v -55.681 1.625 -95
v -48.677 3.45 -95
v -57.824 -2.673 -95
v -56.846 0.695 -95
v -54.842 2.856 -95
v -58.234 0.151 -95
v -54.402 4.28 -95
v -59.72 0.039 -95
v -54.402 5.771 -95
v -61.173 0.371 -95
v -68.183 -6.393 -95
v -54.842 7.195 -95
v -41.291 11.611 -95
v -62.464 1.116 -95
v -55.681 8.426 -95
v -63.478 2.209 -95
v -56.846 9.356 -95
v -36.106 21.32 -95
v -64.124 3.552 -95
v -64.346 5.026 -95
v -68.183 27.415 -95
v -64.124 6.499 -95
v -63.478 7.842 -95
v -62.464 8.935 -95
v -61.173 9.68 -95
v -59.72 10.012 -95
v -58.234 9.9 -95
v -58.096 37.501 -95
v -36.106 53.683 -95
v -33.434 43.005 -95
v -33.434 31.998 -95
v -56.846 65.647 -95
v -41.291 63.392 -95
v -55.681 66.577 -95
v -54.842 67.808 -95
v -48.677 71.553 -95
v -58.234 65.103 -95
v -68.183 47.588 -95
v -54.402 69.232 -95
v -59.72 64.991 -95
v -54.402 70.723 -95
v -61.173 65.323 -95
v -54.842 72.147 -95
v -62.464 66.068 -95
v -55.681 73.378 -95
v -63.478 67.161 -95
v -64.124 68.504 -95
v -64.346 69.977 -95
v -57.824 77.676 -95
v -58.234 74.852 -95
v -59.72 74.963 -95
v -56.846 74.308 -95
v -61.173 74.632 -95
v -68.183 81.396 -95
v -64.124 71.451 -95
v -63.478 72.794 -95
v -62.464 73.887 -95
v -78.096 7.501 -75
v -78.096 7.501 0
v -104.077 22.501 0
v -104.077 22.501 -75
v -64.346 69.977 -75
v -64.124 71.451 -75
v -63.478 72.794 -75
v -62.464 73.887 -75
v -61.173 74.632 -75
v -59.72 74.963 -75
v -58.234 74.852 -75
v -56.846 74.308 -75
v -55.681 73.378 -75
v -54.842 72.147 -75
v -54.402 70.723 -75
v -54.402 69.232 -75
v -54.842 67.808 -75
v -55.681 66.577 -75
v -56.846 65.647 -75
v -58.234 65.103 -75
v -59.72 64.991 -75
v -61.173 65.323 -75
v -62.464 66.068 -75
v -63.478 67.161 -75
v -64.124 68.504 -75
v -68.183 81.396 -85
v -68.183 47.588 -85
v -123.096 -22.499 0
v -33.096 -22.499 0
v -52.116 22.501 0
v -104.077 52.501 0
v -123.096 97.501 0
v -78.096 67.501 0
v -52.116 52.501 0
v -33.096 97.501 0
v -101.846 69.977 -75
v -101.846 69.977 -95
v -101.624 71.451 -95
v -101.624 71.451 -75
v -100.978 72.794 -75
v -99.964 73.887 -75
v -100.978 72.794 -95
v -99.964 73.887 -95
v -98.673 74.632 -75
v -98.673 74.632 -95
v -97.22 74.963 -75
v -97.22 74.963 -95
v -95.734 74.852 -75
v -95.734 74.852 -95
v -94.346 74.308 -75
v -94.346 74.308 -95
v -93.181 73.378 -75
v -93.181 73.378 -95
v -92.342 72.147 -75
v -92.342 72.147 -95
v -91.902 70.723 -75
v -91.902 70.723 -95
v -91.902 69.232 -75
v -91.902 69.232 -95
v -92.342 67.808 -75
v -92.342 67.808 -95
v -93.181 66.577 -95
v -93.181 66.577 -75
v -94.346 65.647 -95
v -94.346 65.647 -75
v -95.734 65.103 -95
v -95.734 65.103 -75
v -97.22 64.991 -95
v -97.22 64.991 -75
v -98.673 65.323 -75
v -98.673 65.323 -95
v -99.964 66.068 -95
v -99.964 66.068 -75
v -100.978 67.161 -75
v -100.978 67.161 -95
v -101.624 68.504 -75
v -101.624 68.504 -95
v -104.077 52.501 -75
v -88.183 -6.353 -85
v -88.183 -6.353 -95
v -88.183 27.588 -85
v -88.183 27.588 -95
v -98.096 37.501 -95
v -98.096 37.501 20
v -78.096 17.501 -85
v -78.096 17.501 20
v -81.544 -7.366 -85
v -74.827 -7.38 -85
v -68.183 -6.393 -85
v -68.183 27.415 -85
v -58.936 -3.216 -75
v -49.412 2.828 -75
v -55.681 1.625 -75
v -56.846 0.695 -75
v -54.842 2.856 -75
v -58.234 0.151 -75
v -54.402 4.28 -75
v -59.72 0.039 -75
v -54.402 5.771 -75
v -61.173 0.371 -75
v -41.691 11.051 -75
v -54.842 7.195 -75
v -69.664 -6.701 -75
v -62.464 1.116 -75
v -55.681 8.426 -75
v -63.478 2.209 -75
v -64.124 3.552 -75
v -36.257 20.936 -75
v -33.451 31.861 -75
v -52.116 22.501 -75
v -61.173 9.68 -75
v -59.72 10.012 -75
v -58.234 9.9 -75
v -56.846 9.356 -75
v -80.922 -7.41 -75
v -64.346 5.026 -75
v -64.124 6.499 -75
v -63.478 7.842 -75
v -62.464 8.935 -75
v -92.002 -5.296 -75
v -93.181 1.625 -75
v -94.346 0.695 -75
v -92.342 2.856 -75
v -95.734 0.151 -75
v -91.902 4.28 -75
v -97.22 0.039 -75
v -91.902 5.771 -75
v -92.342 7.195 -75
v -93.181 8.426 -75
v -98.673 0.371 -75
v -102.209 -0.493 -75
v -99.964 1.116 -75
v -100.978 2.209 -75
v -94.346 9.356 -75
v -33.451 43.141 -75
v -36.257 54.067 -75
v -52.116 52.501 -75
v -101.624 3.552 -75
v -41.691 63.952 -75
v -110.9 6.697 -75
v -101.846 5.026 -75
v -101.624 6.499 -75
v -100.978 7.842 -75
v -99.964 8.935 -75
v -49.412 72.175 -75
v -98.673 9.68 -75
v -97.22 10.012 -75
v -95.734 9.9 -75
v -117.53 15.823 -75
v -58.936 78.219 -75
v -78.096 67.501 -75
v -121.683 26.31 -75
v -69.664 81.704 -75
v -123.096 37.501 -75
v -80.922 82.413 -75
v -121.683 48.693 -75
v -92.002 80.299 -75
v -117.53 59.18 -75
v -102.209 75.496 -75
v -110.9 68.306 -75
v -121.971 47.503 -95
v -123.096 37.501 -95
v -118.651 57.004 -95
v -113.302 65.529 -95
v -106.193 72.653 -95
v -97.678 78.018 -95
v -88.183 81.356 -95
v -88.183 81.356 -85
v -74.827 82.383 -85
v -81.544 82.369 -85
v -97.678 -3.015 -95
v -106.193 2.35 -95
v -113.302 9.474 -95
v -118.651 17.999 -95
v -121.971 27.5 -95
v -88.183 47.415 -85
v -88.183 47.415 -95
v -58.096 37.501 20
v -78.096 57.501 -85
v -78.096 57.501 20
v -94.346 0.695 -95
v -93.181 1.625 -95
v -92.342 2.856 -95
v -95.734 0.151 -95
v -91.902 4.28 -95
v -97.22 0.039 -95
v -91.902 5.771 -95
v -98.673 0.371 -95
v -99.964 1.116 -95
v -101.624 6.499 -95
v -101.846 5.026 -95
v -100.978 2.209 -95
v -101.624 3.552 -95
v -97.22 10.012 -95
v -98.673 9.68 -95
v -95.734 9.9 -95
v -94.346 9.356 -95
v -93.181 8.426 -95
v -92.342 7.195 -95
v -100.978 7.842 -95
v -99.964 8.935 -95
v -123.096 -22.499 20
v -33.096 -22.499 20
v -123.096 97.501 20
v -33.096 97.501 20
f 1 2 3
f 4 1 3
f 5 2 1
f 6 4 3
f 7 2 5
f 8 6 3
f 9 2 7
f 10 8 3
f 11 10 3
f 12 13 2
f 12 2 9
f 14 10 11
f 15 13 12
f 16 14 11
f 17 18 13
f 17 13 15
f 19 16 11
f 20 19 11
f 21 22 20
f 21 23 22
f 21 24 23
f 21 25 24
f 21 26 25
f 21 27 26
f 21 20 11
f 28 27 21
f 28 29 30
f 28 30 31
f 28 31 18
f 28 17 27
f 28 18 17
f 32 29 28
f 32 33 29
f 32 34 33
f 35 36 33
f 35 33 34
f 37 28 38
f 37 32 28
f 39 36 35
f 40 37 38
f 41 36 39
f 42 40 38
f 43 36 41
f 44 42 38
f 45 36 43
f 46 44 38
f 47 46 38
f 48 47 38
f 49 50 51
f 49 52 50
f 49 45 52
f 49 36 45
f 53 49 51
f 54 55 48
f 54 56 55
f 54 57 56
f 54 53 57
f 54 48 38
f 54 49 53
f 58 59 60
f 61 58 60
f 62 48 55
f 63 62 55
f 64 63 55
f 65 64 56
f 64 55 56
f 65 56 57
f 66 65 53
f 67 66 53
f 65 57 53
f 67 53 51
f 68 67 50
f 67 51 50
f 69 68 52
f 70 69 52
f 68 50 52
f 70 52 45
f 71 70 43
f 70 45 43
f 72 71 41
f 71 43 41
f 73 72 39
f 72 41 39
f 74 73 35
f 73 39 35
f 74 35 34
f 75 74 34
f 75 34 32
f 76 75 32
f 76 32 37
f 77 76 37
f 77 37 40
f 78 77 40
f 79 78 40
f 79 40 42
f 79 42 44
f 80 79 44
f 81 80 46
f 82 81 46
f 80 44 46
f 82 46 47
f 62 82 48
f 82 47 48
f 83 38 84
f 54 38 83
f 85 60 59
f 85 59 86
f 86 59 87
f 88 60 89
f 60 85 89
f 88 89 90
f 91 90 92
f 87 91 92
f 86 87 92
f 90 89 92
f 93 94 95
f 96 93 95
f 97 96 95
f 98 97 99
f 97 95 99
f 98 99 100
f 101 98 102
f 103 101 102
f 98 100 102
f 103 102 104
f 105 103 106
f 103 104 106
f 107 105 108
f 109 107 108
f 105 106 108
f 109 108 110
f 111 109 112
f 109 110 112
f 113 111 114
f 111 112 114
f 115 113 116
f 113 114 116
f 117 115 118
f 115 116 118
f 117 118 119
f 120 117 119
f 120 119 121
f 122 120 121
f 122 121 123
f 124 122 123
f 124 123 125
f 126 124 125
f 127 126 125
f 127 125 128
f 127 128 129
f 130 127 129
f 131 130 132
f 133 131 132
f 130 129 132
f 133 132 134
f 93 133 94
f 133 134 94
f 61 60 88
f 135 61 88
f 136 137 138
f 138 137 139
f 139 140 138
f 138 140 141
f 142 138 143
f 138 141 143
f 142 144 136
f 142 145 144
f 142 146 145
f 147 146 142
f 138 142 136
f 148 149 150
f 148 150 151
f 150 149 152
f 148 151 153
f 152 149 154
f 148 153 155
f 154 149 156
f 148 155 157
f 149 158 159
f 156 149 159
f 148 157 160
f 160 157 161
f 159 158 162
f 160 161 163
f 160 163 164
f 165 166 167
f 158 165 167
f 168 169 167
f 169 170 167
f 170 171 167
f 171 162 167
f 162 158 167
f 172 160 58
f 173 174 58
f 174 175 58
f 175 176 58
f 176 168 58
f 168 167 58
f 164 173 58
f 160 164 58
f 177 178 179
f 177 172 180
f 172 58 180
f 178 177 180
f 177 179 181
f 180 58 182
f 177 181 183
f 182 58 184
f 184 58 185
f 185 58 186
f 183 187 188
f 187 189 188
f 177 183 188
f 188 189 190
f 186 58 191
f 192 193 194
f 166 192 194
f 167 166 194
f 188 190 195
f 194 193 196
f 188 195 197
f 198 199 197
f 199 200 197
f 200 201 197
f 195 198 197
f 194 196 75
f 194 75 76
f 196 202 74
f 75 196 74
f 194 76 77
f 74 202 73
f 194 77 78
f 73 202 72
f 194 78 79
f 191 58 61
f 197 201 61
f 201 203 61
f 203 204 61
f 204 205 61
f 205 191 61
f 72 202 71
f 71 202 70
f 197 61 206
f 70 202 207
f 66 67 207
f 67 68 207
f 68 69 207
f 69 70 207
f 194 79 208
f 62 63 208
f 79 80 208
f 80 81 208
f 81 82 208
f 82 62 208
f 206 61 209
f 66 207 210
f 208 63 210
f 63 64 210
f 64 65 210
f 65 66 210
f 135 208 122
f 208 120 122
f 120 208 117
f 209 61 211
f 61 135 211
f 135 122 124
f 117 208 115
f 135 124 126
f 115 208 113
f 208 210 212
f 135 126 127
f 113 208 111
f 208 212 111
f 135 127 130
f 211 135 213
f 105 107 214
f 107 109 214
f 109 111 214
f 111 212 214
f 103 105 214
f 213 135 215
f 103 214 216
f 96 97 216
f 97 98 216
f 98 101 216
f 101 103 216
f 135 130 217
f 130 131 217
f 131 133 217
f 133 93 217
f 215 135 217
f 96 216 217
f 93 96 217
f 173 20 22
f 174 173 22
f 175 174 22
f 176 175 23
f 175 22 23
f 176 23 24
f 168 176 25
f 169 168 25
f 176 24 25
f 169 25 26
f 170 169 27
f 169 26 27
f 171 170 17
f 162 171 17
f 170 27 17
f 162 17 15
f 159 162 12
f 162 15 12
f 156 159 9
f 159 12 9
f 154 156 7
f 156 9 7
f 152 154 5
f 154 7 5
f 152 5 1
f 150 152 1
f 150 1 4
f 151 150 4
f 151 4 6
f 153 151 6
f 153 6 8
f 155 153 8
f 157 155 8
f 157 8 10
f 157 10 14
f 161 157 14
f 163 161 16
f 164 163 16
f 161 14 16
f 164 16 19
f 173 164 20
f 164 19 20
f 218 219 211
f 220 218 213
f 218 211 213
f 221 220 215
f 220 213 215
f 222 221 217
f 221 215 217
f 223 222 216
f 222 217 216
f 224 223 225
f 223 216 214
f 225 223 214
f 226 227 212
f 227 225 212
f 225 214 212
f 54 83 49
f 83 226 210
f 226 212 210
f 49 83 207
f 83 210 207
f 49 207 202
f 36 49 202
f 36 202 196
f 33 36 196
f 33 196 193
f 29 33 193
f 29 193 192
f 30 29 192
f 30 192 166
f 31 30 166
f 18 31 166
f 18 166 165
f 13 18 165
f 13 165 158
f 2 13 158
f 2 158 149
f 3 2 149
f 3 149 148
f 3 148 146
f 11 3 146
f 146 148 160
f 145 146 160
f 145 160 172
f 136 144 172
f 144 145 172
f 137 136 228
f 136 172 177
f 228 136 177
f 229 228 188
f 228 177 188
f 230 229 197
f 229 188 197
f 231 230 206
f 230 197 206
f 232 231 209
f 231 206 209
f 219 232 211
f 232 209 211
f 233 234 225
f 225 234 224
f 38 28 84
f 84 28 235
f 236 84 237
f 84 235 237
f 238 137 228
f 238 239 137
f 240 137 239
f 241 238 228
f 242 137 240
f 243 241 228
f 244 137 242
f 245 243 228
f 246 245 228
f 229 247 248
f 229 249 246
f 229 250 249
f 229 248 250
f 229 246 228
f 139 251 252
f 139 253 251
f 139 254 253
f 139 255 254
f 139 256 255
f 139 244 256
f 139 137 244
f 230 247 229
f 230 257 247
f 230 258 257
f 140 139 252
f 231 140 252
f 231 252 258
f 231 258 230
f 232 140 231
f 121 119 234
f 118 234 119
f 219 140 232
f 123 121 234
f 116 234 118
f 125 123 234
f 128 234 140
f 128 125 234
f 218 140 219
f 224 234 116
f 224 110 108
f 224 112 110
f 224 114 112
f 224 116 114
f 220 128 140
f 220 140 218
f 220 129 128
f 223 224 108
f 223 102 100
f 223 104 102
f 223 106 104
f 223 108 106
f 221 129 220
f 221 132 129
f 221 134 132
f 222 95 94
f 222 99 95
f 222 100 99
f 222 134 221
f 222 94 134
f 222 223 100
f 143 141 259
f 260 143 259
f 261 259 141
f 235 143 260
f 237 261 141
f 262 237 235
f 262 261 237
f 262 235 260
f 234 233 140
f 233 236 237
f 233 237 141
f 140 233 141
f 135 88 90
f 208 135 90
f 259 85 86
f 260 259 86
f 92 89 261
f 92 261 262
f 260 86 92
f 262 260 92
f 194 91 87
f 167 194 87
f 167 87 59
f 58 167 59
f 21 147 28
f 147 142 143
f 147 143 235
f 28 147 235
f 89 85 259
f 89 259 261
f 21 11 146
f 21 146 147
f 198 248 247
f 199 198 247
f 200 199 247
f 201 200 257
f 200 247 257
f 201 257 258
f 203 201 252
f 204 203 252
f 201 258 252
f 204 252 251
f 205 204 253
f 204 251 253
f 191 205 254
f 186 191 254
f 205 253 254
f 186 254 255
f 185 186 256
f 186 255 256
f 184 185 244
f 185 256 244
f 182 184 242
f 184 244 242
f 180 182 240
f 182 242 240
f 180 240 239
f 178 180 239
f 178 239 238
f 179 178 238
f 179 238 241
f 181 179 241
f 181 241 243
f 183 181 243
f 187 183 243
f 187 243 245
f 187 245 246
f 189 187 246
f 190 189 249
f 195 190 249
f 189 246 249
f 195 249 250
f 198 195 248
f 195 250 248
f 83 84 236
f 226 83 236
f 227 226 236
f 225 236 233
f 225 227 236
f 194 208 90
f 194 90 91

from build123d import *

# Parameters (mm, degrees)
SKETCH2_W           = 90
SKETCH2_H           = 120
BOSS_EXTRUDE4_DEPTH = 20
BOSS_EXTRUDE5_DEPTH = 75
SKETCH20_R          = 45
BOSS_EXTRUDE6_DEPTH = 20
SKETCH21_W          = 20
SKETCH21_H          = 100
BOSS_EXTRUDE8_DEPTH = 10
SKETCH26_R          = 5
CUT_EXTRUDE2_DEPTH  = 20
CUT_EXTRUDE3_DEPTH  = 115


with BuildPart() as part:
    # Sketch2 → Boss-Extrude4 (new body)
    with BuildSketch(Plane.XY):
        with Locations((-78.096450442, 37.501466256)):
            Rectangle(SKETCH2_W, SKETCH2_H)
    extrude(amount=BOSS_EXTRUDE4_DEPTH)

    # Sketch19 → Boss-Extrude5 (add)
    with BuildSketch(Plane(origin=(0, 0, 0), x_dir=(-1, 0, 0), z_dir=(0, 0, -1))):
        Polygon((78.096450442, 67.501466256), (52.115688328, 52.501466256), (52.115688328, 22.501466256), (78.096450442, 7.501466256), (104.077212555, 22.501466256), (104.077212555, 52.501466256), align=None)
    extrude(amount=BOSS_EXTRUDE5_DEPTH)

    # Sketch20 → Boss-Extrude6 (add)
    with BuildSketch(Plane(origin=(0, 0, -75), x_dir=(-1, 0, 0), z_dir=(0, 0, -1))):
        with Locations((78.096450442, 37.501466256)):
            Circle(SKETCH20_R)
    extrude(amount=BOSS_EXTRUDE6_DEPTH)


with BuildPart() as body_2:
    # Sketch21 → Boss-Extrude8 (new body)
    with BuildSketch(Plane(origin=(0, 0, -95), x_dir=(-1, 0, 0), z_dir=(0, 0, -1))):
        with Locations((78.183292606, 37.571308656)):
            Rectangle(SKETCH21_W, SKETCH21_H)
    extrude(amount=-BOSS_EXTRUDE8_DEPTH)


with BuildPart() as part_1:
    add(part.part)

    # Combine1: cut body 2
    add(body_2.part, mode=Mode.SUBTRACT)

    # Sketch26 → Cut-Extrude2 (cut)
    with BuildSketch(Plane(origin=(0, 0, -95), x_dir=(-1, 0, 0), z_dir=(0, 0, -1))):
        with Locations((59.346450442, 69.977418898)):
            Circle(SKETCH26_R)
        with Locations((96.846450442, 69.977418898)):
            Circle(SKETCH26_R)
        with Locations((59.346450442, 5.025513614)):
            Circle(SKETCH26_R)
        with Locations((96.846450442, 5.025513614)):
            Circle(SKETCH26_R)
    extrude(amount=-CUT_EXTRUDE2_DEPTH, mode=Mode.SUBTRACT)

    # Sketch28 → Cut-Extrude3 (cut)
    with BuildSketch(Plane.XY.offset(20)):
        Polygon((-58.096450442, 37.501466256), (-78.096450442, 57.501466256), (-98.096450442, 37.501466256), (-78.096450442, 17.501466256), align=None)
    extrude(amount=-CUT_EXTRUDE3_DEPTH, mode=Mode.SUBTRACT)


solid = part_1.part
